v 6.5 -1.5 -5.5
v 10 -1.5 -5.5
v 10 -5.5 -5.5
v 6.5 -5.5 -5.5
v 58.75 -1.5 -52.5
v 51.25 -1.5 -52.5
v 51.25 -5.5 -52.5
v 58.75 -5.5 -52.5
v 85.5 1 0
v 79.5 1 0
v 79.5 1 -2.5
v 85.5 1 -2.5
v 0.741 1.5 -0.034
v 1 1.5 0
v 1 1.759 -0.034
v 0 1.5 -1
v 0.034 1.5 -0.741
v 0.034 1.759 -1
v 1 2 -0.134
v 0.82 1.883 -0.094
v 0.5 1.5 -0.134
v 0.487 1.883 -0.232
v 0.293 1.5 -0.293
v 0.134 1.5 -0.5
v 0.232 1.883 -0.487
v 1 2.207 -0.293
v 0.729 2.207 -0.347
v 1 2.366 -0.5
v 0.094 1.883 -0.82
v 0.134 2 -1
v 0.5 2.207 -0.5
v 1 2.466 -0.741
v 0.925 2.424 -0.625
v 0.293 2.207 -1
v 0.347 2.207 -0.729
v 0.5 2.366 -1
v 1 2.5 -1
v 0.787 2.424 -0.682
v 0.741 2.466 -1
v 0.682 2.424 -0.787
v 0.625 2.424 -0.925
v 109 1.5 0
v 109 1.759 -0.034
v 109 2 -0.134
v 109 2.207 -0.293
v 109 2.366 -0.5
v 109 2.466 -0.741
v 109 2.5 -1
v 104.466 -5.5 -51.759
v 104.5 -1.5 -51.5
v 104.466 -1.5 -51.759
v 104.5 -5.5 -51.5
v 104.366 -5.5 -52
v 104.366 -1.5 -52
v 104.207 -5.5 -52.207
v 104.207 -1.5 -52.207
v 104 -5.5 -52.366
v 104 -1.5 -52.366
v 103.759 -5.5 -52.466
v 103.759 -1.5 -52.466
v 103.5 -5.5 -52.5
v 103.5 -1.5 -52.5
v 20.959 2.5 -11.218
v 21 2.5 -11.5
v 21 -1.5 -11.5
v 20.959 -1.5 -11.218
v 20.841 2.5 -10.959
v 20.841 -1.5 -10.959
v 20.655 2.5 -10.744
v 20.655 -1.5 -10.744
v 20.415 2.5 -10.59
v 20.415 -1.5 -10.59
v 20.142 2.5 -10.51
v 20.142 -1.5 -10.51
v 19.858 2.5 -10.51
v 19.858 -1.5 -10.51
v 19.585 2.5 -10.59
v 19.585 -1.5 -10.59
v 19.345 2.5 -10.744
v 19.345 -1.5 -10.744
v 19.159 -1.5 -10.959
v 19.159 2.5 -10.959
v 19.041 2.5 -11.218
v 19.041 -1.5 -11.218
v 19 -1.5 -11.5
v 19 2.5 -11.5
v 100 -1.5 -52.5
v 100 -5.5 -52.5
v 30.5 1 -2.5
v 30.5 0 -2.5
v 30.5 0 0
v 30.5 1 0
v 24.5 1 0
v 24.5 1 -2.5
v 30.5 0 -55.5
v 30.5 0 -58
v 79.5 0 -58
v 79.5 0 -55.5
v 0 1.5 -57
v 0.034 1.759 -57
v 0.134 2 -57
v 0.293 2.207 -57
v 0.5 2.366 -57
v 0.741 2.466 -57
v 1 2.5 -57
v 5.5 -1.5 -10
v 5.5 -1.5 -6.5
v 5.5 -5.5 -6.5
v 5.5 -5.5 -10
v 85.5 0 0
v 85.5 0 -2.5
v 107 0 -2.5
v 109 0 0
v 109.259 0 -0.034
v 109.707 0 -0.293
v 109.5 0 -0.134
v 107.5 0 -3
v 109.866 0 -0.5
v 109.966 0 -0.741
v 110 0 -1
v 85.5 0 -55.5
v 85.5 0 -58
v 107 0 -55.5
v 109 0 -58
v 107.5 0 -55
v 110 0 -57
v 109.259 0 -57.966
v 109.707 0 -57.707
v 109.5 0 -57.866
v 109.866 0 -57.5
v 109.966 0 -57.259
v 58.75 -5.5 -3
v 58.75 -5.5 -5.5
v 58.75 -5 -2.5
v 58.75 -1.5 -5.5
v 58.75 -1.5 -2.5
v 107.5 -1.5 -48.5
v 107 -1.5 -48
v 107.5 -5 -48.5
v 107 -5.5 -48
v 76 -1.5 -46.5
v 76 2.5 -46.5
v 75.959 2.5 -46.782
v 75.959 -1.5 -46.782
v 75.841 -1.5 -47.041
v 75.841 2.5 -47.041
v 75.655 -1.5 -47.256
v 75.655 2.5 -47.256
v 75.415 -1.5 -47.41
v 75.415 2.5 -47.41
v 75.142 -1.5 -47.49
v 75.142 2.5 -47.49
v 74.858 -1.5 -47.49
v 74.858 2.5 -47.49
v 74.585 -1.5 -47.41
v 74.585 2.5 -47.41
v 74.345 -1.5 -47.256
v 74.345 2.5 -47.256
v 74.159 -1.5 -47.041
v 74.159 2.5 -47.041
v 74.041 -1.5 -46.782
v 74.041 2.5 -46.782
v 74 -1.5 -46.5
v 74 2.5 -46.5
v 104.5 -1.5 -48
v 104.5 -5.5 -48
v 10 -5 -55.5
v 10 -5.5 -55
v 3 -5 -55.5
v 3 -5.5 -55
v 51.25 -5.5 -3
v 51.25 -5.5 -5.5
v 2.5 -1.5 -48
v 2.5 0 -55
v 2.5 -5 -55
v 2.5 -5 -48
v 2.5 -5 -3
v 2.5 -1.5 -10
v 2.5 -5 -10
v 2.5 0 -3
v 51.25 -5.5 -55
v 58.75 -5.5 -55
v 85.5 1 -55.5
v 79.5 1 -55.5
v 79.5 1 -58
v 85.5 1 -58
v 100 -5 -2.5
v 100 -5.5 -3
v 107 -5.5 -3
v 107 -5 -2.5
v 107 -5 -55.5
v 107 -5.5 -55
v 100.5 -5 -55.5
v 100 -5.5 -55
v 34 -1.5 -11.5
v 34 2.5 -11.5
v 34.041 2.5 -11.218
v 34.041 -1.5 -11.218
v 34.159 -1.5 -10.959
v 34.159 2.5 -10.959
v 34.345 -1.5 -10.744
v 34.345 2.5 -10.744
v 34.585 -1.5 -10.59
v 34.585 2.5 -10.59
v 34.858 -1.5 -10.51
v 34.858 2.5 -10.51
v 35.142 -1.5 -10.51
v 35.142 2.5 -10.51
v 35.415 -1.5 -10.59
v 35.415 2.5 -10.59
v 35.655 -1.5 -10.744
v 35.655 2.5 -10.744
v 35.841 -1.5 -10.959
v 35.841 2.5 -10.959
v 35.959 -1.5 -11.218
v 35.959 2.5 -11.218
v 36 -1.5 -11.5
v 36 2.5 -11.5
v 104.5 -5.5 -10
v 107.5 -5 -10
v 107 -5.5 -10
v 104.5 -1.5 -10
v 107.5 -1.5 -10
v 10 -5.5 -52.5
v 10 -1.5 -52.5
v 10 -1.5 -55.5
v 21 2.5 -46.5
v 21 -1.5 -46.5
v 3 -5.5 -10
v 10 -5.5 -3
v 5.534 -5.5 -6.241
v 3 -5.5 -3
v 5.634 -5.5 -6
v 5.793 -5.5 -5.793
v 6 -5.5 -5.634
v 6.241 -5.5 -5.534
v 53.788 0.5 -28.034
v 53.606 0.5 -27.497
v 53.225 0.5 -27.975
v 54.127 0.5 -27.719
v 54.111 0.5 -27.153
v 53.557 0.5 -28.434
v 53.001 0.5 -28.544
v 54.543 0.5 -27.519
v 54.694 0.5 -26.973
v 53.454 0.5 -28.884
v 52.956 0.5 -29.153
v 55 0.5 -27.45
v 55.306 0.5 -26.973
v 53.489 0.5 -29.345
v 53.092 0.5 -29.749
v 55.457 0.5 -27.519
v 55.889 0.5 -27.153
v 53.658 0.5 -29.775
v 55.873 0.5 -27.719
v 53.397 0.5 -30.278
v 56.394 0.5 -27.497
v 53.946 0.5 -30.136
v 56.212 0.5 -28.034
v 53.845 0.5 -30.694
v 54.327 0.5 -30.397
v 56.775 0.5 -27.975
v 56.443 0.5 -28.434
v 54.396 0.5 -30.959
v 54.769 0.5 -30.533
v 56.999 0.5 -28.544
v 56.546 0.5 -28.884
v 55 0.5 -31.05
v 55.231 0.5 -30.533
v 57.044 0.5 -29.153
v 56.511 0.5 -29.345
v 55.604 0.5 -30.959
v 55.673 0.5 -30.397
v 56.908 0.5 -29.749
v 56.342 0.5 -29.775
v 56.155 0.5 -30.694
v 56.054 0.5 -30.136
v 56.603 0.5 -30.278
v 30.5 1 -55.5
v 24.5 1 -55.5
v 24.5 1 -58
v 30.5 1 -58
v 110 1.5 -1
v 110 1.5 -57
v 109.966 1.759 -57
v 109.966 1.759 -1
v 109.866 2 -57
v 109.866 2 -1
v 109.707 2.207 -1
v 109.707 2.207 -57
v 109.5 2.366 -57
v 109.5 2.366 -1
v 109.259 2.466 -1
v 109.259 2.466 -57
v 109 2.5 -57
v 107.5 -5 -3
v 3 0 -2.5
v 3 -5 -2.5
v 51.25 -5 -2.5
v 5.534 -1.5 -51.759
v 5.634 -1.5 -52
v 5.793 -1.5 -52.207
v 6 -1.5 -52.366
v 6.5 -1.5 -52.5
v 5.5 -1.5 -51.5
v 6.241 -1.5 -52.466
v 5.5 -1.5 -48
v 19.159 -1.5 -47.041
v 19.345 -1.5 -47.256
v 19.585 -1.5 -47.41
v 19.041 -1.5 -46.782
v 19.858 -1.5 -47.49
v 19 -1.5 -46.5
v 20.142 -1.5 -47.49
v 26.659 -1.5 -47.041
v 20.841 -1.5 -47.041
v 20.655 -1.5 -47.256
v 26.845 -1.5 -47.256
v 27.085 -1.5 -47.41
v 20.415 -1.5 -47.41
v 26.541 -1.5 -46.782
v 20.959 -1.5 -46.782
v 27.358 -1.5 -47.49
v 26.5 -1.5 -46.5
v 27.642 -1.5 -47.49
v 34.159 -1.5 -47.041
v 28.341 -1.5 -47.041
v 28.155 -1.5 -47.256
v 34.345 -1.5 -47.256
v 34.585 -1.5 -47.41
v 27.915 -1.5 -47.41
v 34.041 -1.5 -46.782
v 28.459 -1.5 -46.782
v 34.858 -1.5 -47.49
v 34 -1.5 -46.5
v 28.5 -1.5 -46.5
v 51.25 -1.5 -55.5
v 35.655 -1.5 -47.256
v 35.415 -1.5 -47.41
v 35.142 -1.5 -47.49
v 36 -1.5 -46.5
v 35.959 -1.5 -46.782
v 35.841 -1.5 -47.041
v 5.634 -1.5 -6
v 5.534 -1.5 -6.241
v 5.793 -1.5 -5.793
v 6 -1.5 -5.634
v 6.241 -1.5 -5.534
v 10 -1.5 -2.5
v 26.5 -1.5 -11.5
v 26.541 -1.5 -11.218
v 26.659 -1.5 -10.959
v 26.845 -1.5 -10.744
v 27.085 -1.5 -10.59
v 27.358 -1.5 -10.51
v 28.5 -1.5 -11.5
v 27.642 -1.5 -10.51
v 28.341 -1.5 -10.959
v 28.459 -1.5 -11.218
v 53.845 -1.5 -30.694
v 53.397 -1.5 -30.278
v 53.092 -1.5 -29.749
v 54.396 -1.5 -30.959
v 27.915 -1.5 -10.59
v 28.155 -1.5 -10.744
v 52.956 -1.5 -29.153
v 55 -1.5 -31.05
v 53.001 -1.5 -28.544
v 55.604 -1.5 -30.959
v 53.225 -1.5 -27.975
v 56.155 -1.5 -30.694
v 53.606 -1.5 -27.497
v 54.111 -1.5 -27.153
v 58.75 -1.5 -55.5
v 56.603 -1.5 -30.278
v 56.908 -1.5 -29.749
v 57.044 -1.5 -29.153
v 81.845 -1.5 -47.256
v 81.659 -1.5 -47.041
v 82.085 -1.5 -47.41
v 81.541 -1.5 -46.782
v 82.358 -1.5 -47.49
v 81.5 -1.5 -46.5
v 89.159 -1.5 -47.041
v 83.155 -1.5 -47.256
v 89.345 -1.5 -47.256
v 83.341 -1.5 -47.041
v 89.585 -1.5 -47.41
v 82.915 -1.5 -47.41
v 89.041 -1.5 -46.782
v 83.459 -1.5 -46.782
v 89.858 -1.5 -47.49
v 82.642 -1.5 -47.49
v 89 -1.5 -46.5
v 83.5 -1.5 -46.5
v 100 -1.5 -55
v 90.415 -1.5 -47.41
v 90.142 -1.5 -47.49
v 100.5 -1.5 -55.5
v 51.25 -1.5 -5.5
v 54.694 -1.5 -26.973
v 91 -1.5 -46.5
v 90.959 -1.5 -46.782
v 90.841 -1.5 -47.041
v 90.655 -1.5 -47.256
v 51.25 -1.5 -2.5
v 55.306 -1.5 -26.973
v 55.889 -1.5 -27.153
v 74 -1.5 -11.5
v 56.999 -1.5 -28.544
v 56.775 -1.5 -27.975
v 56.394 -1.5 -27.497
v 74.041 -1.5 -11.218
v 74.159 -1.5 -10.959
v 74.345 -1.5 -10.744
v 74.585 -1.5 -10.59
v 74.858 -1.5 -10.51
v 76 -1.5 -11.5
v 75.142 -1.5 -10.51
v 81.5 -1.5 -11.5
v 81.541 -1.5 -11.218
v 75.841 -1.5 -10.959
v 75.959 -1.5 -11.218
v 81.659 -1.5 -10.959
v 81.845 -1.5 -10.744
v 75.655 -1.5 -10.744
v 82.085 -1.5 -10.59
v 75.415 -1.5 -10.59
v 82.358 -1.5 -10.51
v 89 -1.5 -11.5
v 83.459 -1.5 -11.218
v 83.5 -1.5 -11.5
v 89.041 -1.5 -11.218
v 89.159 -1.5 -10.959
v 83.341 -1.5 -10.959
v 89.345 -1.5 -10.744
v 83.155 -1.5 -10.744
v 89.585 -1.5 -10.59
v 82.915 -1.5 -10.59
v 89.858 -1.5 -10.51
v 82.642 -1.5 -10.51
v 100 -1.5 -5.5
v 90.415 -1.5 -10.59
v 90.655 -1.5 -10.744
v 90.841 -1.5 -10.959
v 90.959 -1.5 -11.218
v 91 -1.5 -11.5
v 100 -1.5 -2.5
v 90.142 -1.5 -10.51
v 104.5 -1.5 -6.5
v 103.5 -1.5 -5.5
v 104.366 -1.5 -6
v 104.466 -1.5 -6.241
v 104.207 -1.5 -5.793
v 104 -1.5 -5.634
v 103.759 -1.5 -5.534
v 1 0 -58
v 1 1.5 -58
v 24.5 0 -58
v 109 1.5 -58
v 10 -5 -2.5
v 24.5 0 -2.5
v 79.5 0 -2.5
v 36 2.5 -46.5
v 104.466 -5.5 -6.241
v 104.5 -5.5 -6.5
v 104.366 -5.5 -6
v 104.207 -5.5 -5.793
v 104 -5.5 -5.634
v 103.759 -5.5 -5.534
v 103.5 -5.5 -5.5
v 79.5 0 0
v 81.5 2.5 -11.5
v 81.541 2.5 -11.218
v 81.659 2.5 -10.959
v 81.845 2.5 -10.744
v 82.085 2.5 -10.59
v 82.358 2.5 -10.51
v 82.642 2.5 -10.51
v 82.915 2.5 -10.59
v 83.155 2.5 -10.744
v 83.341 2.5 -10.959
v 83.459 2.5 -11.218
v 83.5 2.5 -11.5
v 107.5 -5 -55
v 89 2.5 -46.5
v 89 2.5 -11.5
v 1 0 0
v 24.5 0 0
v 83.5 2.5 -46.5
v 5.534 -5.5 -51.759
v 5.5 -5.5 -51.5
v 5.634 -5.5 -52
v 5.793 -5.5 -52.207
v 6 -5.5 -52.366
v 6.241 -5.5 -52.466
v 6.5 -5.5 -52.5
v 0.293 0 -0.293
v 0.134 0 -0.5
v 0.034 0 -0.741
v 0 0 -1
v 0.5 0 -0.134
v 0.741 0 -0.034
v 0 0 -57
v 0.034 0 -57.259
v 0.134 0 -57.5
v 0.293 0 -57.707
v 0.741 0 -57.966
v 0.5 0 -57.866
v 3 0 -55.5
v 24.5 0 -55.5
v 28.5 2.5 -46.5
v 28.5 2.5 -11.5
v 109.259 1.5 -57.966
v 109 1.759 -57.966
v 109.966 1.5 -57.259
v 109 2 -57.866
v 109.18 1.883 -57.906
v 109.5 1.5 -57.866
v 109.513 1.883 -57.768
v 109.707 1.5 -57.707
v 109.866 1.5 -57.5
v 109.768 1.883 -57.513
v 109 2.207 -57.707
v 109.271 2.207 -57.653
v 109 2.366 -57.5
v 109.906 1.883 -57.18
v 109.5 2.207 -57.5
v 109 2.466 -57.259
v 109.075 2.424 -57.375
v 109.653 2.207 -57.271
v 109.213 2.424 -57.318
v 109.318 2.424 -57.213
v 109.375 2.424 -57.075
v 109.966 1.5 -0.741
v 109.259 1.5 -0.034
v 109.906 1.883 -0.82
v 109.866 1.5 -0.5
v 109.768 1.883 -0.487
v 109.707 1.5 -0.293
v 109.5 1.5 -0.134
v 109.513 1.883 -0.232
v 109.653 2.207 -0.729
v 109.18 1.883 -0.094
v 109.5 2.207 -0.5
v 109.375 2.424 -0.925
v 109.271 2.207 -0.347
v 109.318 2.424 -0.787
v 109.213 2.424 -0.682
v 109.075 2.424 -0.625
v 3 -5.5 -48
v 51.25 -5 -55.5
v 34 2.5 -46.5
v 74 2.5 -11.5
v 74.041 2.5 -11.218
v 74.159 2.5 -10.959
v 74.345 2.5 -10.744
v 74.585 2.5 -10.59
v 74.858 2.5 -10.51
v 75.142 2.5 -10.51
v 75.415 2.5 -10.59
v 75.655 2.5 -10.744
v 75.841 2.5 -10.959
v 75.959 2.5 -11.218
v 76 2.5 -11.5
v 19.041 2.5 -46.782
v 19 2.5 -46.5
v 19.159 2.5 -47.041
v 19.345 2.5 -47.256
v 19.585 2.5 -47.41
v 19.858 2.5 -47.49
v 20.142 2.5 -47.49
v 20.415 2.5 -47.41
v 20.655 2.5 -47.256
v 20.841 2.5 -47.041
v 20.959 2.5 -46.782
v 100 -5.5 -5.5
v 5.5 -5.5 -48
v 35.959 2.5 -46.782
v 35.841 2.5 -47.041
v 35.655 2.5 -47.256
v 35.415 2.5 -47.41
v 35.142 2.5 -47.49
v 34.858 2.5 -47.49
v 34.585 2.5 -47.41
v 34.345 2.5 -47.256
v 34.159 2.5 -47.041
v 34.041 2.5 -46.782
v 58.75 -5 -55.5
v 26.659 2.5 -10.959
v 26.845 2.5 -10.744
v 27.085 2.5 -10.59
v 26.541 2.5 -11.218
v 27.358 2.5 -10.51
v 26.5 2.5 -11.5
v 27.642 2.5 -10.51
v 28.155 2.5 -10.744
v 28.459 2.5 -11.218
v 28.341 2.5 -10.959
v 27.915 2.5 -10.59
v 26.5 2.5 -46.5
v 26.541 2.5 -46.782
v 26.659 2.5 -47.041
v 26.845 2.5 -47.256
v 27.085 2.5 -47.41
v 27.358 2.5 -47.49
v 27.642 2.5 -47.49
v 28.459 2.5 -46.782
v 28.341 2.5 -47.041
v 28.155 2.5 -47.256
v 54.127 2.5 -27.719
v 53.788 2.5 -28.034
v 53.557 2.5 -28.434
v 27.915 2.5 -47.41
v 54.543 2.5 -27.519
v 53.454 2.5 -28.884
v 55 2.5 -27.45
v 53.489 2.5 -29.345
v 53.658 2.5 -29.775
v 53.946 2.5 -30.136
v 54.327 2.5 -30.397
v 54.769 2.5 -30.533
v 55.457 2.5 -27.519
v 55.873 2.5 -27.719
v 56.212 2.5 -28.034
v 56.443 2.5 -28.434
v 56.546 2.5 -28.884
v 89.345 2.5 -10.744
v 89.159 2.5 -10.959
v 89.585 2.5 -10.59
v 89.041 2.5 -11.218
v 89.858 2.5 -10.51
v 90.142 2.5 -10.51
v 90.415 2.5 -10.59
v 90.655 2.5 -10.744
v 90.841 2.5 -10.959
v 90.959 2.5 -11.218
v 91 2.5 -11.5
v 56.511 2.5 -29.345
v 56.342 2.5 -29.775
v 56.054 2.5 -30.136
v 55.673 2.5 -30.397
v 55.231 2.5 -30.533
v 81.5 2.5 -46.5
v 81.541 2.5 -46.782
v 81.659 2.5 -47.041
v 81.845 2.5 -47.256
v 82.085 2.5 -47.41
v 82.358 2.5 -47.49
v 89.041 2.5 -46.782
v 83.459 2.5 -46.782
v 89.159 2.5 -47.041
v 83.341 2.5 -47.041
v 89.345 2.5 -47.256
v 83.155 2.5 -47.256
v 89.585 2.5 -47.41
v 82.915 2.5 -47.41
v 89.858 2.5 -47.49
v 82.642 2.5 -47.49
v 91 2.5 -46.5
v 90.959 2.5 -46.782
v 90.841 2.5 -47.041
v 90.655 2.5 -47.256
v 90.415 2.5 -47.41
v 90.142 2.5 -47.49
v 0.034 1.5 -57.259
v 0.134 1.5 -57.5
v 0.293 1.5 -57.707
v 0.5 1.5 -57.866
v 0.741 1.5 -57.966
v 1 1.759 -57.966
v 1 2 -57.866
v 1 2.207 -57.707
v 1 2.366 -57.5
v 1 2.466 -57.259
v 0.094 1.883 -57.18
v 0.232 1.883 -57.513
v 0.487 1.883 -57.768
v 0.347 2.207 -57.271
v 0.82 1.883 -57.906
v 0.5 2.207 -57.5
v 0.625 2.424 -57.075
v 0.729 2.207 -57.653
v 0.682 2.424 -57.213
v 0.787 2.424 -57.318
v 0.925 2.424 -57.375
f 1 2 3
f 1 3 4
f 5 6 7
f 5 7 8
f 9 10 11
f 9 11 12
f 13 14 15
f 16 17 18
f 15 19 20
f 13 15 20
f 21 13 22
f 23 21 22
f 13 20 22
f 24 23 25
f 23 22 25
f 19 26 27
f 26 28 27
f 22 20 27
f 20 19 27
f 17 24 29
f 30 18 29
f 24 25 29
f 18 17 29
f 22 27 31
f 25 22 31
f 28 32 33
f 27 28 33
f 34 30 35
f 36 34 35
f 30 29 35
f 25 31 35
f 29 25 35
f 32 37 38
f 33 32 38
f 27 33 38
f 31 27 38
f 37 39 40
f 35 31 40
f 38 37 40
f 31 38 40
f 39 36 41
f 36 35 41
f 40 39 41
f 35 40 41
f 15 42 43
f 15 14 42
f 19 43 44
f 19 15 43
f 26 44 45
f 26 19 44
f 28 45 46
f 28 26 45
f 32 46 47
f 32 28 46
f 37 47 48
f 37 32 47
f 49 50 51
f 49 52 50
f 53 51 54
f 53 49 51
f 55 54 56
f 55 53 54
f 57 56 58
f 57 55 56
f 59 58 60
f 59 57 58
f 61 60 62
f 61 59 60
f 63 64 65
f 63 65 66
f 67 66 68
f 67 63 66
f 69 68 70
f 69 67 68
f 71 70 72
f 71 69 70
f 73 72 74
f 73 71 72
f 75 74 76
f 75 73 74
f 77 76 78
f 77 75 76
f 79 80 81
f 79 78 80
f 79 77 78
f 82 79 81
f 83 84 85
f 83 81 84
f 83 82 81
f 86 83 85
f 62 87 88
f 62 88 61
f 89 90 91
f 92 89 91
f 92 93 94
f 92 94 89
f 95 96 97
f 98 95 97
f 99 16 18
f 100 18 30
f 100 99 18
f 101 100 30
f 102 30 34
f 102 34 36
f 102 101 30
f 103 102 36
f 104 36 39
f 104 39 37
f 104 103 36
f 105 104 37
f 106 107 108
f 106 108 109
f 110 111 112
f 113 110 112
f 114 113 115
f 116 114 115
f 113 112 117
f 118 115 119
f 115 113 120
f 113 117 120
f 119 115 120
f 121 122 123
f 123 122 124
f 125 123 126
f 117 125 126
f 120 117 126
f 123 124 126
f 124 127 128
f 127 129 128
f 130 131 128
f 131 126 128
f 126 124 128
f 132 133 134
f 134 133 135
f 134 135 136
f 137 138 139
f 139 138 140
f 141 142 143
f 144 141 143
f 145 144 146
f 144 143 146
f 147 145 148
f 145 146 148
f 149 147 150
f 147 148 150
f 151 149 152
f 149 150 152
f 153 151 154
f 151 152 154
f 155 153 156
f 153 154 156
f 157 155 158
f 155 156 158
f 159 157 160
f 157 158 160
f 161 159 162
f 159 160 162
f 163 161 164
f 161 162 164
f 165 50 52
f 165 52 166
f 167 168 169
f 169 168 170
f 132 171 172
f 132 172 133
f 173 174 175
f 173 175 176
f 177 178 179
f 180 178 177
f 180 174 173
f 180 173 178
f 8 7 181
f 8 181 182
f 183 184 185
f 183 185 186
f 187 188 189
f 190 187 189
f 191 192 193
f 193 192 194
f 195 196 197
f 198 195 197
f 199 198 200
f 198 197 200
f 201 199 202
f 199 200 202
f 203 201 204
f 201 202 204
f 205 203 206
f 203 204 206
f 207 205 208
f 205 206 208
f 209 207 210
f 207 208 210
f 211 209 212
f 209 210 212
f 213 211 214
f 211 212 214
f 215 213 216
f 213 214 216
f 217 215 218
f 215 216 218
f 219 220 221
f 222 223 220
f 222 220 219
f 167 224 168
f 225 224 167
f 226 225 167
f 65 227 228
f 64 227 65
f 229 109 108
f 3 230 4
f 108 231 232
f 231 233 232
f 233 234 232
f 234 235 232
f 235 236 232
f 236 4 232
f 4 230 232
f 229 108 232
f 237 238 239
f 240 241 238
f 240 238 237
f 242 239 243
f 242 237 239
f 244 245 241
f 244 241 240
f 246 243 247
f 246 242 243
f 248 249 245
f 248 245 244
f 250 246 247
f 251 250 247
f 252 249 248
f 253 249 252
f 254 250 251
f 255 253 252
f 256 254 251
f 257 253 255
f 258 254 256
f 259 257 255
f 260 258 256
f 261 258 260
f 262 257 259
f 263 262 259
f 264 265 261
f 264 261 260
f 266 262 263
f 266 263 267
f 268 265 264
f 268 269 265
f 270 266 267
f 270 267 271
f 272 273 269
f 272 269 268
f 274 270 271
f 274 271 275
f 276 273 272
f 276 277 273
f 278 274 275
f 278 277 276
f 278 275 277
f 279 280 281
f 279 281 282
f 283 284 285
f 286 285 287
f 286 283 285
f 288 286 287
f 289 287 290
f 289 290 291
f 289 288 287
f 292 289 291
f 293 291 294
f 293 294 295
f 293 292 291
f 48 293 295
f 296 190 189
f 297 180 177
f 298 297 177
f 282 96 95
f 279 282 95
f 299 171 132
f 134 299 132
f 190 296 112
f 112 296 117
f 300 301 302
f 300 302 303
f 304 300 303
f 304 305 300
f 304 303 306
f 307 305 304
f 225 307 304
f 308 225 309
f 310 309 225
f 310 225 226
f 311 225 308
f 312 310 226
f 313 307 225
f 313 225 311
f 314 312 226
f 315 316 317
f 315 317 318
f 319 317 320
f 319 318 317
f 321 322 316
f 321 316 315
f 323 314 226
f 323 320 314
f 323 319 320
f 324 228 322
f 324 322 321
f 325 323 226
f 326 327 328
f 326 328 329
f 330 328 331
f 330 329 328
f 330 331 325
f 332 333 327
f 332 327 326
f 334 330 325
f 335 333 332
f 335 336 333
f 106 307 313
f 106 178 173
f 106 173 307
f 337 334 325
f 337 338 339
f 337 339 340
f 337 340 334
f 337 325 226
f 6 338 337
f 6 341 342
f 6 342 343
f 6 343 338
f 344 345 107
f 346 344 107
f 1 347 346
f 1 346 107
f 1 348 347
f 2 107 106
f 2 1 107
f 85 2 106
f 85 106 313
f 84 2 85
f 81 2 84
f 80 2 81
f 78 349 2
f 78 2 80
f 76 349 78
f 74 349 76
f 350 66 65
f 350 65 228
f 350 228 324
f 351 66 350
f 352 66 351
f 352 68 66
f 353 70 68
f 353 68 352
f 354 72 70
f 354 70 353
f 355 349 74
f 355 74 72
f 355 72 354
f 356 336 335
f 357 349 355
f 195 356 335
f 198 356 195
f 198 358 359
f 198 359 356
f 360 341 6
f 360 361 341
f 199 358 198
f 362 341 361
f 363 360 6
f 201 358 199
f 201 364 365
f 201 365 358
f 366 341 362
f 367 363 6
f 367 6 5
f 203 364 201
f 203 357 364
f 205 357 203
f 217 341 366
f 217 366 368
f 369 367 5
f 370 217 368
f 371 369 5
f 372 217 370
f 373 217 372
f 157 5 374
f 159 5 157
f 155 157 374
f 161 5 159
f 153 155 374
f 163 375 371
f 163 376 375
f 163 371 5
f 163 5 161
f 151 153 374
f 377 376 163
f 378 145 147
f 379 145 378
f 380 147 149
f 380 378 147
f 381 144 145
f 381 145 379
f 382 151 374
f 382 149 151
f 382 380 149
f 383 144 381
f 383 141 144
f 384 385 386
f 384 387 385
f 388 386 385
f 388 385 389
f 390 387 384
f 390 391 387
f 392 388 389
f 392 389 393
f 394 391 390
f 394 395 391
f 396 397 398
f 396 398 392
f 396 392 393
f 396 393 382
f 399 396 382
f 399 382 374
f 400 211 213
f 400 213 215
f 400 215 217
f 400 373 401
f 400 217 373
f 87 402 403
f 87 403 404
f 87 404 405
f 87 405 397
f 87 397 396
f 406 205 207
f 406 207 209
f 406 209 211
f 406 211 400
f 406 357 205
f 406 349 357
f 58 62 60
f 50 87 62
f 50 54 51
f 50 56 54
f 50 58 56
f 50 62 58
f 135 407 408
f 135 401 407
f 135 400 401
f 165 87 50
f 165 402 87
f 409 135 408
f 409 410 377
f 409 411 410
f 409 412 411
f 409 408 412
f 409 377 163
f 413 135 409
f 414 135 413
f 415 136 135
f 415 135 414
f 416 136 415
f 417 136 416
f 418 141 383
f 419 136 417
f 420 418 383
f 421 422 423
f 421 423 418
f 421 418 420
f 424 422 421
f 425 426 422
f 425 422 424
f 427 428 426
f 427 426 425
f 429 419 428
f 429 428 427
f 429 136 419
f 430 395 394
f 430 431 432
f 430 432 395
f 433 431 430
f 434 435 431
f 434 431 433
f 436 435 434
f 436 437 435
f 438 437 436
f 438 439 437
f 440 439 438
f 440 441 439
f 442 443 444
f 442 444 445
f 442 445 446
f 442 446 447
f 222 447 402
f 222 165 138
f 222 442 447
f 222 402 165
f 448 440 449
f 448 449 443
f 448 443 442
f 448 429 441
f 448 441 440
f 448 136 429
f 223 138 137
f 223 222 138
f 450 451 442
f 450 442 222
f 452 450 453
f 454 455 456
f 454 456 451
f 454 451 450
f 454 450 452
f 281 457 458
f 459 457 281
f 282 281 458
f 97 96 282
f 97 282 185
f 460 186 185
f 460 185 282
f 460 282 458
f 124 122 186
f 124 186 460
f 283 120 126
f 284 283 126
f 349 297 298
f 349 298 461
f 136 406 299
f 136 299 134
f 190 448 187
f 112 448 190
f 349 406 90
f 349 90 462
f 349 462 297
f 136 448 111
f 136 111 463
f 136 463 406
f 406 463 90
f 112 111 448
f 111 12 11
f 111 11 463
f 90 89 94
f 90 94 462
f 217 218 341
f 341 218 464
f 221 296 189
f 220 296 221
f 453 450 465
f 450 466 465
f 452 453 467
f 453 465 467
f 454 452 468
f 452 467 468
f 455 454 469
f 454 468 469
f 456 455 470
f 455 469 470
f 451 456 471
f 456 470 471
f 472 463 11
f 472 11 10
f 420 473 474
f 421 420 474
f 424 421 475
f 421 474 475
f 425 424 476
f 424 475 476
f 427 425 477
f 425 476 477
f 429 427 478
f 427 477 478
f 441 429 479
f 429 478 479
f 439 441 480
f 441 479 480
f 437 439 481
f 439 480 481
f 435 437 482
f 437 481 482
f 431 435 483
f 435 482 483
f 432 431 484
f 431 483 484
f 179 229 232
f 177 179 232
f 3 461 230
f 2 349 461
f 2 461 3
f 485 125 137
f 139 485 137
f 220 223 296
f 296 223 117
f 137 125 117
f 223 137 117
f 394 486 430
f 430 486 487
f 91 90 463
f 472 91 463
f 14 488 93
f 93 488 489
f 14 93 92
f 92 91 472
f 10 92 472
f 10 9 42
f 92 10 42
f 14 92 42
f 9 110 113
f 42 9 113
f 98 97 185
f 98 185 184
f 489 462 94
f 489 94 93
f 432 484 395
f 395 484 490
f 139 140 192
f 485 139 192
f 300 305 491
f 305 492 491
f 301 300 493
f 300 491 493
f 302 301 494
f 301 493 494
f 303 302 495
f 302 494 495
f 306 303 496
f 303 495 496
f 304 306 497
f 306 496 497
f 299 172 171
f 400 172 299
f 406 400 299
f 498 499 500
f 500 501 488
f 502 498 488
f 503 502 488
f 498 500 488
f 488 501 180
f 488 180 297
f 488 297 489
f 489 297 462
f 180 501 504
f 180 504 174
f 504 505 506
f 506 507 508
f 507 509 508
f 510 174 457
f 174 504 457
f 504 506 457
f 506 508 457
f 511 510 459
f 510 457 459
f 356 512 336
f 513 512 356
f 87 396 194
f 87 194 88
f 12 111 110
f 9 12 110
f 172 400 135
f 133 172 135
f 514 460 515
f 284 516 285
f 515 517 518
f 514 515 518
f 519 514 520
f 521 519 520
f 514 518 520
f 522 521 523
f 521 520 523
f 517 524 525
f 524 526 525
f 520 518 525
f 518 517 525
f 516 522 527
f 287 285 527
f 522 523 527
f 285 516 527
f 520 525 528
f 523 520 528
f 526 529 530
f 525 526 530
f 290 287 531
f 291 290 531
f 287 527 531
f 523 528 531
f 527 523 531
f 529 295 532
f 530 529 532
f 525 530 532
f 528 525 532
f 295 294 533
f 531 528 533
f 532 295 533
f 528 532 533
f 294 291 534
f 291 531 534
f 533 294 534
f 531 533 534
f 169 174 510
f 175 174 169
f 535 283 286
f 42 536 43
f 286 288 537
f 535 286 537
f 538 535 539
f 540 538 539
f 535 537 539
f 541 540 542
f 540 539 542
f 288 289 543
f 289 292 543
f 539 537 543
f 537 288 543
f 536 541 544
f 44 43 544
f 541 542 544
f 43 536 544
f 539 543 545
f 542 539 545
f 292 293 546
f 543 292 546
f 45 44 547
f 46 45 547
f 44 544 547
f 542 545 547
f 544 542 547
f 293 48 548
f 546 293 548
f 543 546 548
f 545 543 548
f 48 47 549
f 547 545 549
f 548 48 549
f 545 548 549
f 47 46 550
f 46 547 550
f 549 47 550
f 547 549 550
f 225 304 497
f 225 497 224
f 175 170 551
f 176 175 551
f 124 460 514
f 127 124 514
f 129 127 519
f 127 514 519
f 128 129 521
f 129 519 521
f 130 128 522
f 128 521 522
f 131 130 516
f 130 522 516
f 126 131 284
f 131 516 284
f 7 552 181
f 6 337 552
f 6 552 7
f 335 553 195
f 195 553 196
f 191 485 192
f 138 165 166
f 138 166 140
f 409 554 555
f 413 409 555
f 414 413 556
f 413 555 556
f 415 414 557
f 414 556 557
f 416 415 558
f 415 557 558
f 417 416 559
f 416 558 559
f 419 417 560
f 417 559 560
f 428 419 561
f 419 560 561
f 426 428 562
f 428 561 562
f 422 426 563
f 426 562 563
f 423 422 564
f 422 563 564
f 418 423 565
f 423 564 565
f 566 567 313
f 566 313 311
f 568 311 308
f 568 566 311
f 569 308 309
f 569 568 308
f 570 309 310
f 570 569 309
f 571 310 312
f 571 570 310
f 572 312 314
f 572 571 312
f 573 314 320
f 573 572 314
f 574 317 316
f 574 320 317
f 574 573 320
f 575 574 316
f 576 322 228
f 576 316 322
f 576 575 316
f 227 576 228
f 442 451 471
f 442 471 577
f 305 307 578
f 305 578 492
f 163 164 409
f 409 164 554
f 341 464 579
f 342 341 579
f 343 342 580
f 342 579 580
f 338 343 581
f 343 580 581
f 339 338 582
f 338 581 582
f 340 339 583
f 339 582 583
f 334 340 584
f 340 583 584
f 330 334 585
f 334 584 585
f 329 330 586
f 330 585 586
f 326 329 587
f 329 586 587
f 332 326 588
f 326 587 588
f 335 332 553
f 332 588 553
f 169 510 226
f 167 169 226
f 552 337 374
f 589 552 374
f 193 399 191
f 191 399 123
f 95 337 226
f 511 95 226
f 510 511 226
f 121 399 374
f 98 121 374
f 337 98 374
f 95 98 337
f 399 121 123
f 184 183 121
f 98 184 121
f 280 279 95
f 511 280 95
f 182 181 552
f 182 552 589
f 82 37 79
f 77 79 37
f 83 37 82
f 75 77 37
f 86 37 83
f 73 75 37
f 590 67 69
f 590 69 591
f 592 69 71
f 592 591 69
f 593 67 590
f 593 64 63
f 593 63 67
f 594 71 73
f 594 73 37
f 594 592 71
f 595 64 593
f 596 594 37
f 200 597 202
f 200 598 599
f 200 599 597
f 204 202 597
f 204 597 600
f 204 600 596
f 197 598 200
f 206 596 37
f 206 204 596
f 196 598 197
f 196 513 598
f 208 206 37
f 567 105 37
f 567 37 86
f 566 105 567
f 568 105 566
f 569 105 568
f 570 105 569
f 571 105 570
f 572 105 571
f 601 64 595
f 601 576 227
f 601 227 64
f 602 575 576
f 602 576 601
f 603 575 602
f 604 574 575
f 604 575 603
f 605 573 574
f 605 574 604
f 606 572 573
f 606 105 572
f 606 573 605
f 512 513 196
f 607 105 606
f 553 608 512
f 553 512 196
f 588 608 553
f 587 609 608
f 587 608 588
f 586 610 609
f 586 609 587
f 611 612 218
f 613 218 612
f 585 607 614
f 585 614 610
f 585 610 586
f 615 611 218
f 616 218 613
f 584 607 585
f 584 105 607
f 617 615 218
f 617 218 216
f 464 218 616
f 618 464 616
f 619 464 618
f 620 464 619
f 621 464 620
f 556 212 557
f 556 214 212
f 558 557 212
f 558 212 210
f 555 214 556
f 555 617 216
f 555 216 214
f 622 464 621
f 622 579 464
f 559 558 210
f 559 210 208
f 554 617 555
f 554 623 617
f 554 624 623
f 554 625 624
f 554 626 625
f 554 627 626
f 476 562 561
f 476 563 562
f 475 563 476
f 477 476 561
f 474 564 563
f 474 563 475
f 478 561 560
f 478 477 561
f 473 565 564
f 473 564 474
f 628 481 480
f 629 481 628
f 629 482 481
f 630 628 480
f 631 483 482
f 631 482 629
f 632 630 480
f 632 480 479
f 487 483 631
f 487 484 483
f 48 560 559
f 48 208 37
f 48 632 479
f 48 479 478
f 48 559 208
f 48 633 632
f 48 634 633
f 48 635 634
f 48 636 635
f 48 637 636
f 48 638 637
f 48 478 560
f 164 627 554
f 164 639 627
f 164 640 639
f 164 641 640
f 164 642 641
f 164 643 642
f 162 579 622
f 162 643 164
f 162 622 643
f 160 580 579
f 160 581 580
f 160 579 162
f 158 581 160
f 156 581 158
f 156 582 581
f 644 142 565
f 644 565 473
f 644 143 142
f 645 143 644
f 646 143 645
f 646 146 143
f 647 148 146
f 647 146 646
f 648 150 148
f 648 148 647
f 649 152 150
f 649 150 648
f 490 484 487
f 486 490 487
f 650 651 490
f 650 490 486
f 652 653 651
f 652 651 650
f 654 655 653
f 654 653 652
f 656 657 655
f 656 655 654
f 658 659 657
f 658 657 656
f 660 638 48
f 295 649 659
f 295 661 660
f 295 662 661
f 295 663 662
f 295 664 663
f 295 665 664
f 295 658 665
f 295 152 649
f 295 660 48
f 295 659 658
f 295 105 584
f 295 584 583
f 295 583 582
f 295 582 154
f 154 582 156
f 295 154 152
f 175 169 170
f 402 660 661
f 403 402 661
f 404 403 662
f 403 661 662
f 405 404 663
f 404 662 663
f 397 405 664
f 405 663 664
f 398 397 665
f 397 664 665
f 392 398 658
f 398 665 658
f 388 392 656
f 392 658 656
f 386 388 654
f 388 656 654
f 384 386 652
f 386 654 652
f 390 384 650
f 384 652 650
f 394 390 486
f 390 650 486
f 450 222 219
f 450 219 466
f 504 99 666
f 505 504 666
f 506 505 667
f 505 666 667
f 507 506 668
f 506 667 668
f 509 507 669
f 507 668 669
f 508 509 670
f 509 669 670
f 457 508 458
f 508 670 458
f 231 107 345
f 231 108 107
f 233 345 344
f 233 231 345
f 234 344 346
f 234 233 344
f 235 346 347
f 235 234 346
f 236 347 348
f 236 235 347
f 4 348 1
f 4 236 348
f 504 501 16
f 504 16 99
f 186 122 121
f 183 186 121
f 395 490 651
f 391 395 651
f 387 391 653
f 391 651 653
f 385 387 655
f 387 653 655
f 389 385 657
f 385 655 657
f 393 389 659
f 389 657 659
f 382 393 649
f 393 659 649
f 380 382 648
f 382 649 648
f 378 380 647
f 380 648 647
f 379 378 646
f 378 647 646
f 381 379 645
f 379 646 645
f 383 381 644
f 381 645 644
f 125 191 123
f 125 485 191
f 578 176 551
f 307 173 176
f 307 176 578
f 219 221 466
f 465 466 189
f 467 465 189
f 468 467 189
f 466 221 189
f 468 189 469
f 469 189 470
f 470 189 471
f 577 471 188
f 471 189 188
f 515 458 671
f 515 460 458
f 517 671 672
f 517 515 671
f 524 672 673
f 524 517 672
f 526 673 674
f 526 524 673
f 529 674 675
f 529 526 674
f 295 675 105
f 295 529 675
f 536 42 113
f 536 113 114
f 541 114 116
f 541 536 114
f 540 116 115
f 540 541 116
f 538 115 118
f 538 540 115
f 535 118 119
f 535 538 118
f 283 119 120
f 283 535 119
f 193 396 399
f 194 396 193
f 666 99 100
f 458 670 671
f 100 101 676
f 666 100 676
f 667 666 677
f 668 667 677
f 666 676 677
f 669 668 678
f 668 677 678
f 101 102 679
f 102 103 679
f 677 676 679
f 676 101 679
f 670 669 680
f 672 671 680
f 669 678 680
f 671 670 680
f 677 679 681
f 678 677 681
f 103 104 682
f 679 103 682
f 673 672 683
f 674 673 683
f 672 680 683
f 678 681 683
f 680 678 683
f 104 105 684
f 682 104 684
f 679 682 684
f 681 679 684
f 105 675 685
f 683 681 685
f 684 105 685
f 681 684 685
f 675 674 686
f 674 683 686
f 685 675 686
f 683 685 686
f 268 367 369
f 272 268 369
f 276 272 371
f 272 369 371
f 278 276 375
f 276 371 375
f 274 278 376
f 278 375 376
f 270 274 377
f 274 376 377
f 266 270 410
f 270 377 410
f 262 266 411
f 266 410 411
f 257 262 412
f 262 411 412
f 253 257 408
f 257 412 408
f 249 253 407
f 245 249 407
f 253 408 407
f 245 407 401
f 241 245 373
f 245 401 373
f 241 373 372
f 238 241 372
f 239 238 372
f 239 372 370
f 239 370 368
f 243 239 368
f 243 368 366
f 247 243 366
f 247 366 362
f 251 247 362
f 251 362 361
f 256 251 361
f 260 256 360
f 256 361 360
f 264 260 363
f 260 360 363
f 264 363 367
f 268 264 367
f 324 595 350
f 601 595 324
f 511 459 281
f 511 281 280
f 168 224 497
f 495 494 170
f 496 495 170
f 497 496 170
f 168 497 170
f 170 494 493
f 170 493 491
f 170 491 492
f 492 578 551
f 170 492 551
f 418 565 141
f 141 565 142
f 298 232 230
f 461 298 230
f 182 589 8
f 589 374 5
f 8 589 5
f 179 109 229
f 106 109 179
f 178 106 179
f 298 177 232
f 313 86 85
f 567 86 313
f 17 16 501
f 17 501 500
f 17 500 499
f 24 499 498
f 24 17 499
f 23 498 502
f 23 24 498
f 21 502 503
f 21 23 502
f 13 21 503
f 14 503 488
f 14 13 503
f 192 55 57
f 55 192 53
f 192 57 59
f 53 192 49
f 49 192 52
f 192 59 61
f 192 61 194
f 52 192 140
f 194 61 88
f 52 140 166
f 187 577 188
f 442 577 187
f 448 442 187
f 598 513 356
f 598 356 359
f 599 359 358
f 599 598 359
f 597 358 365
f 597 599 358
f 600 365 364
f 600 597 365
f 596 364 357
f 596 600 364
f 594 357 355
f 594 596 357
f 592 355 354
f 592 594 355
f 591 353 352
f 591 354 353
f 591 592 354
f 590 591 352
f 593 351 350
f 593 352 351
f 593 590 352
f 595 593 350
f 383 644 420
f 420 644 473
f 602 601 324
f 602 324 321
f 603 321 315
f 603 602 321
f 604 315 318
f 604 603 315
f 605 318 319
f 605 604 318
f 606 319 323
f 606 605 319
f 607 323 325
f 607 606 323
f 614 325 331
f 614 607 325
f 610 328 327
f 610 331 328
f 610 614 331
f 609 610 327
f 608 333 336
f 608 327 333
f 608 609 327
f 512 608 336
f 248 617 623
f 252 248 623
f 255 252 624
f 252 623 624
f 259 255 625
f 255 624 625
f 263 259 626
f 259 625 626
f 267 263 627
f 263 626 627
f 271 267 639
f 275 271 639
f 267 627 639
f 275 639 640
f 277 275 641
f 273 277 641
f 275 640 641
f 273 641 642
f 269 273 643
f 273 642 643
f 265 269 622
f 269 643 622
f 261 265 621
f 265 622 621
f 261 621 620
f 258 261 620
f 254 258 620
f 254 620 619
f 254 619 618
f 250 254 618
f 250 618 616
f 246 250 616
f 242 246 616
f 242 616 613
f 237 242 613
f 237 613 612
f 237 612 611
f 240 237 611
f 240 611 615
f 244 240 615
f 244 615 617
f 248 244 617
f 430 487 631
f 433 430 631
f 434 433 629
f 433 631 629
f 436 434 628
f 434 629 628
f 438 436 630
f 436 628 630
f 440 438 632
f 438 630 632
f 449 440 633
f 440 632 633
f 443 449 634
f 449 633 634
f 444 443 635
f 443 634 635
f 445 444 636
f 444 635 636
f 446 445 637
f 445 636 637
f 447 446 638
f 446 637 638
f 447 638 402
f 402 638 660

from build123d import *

# Parameters (mm, degrees)
SKETCH1_W           = 110
SKETCH1_H           = 58
BOSS_EXTRUDE1_DEPTH = 2.5
SKETCH2_W           = 105
SKETCH2_H           = 53
BOSS_EXTRUDE2_DEPTH = 1.5
SKETCH3_W           = 7.5
SKETCH3_H           = 3
BOSS_EXTRUDE3_DEPTH = 4
FILLET1_R           = 1
SKETCH4_W           = 6
SKETCH4_H           = 2.5
CUT_EXTRUDE1_DEPTH  = 1
FILLET2_R           = 1
CHAMFER1_SIZE       = 0.5
CUT_EXTRUDE2_DEPTH  = 125.611395948
FILLET3_R           = 1
SKETCH6_R           = 1.55
CUT_EXTRUDE3_DEPTH  = 125.611395948
SKETCH7_R           = 2.05
CUT_EXTRUDE4_DEPTH  = 2


with BuildPart() as part:
    # Sketch1 → Boss-Extrude1 (new body)
    with BuildSketch(Plane(origin=(0, 0, 0), x_dir=(1, 0, 0), z_dir=(0, 1, 0))):
        with Locations((55, 29)):
            Rectangle(SKETCH1_W, SKETCH1_H)
    extrude(amount=BOSS_EXTRUDE1_DEPTH)

    # Sketch2 → Boss-Extrude2 (add)
    with BuildSketch(Plane.XZ):
        with Locations((55, -29)):
            Rectangle(SKETCH2_W, SKETCH2_H)
    extrude(amount=BOSS_EXTRUDE2_DEPTH)

    # Sketch3 → Boss-Extrude3 (add)
    with BuildSketch(Plane.XZ.offset(1.5)):
        with Locations((55, -4)):
            Rectangle(SKETCH3_W, SKETCH3_H)
        Polygon((2.5, -2.5), (10, -2.5), (10, -5.5), (5.5, -5.5), (5.5, -10), (2.5, -10), align=None)
        Polygon((107.5, -2.5), (107.5, -10), (104.5, -10), (104.5, -5.5), (100, -5.5), (100, -2.5), align=None)
        Polygon((107.5, -55.5), (100, -55.5), (100, -52.5), (104.5, -52.5), (104.5, -48), (107.5, -48), align=None)
        with Locations((55, -54)):
            Rectangle(SKETCH3_W, SKETCH3_H)
        Polygon((2.5, -55.5), (2.5, -48), (5.5, -48), (5.5, -52.5), (10, -52.5), (10, -55.5), align=None)
    extrude(amount=BOSS_EXTRUDE3_DEPTH)

    # Fillet1
    fillet1_edges = [part.edges().sort_by_distance(p)[0] for p in [
        (104.5, -3.5, -52.5),
        (5.5, -3.5, -5.5),
        (104.5, -3.5, -5.5),
        (5.5, -3.5, -52.5),
    ]]
    fillet(fillet1_edges, radius=FILLET1_R)

    # Sketch4 → Cut-Extrude1 (cut)
    with BuildSketch(Plane.XZ):
        with Locations((27.5, -1.25)):
            Rectangle(SKETCH4_W, SKETCH4_H)
        with Locations((82.5, -1.25)):
            Rectangle(SKETCH4_W, SKETCH4_H)
        with Locations((82.5, -56.75)):
            Rectangle(SKETCH4_W, SKETCH4_H)
        with Locations((27.5, -56.75)):
            Rectangle(SKETCH4_W, SKETCH4_H)
    extrude(amount=-CUT_EXTRUDE1_DEPTH, mode=Mode.SUBTRACT)

    # Fillet2
    fillet2_edges = [part.edges().sort_by_distance(p)[0] for p in [
        (0, 1.25, -58),
        (110, 1.25, -58),
        (110, 1.25, 0),
        (0, 1.25, 0),
    ]]
    fillet(fillet2_edges, radius=FILLET2_R)

    # Chamfer1
    chamfer1_edges = [part.edges().sort_by_distance(p)[0] for p in [
        (2.5, -2.75, -2.5),
        (2.5, -2.75, -55.5),
        (107.5, -2.75, -55.5),
        (107.5, -2.75, -2.5),
        (107.5, -3.5, -48),
        (100, -3.5, -55.5),
        (107.5, -5.5, -51.75),
        (103.75, -5.5, -55.5),
        (2.5, -5.5, -6.25),
        (6.25, -5.5, -2.5),
        (55, -5.5, -2.5),
        (103.75, -5.5, -2.5),
        (107.5, -5.5, -6.25),
        (55, -5.5, -55.5),
        (6.25, -5.5, -55.5),
        (2.5, -5.5, -51.75),
    ]]
    chamfer(chamfer1_edges, length=CHAMFER1_SIZE)

    # Sketch5 → Cut-Extrude2 (cut, through all)
    with BuildSketch(Plane(origin=(0, 2.5, 0), x_dir=(1, 0, 0), z_dir=(0, 1, 0))):
        with BuildLine():
            Line((28.5, 46.5), (28.5, 11.5))
            ThreePointArc((28.5, 11.5), (27.5, 10.5), (26.5, 11.5))
            Line((26.5, 11.5), (26.5, 46.5))
            ThreePointArc((26.5, 46.5), (27.5, 47.5), (28.5, 46.5))
        make_face()
        with BuildLine():
            Line((34, 46.5), (34, 11.5))
            ThreePointArc((34, 11.5), (35, 10.5), (36, 11.5))
            Line((36, 11.5), (36, 46.5))
            ThreePointArc((36, 46.5), (35, 47.5), (34, 46.5))
        make_face()
        with BuildLine():
            Line((21, 46.5), (21, 11.5))
            ThreePointArc((21, 11.5), (20, 10.5), (19, 11.5))
            Line((19, 11.5), (19, 46.5))
            ThreePointArc((19, 46.5), (20, 47.5), (21, 46.5))
        make_face()
        with BuildLine():
            Line((89, 46.5), (89, 11.5))
            ThreePointArc((89, 11.5), (90, 10.5), (91, 11.5))
            Line((91, 11.5), (91, 46.5))
            ThreePointArc((91, 46.5), (90, 47.5), (89, 46.5))
        make_face()
        with BuildLine():
            Line((74, 46.5), (74, 11.5))
            ThreePointArc((74, 11.5), (75, 10.5), (76, 11.5))
            Line((76, 11.5), (76, 46.5))
            ThreePointArc((76, 46.5), (75, 47.5), (74, 46.5))
        make_face()
        with BuildLine():
            Line((81.5, 46.5), (81.5, 11.5))
            ThreePointArc((81.5, 11.5), (82.5, 10.5), (83.5, 11.5))
            Line((83.5, 11.5), (83.5, 46.5))
            ThreePointArc((83.5, 46.5), (82.5, 47.5), (81.5, 46.5))
        make_face()
    extrude(amount=-CUT_EXTRUDE2_DEPTH, mode=Mode.SUBTRACT)

    # Fillet3
    fillet3_edges = [part.edges().sort_by_distance(p)[0] for p in [
        (0, 2.5, -29),
        (55, 2.5, -58),
        (55, 2.5, 0),
        (110, 2.5, -29),
        (109.707106781, 2.5, -0.292893219),
        (109.707106781, 2.5, -57.707106781),
        (0.292893219, 2.5, -0.292893219),
        (0.292893219, 2.5, -57.707106781),
    ]]
    fillet(fillet3_edges, radius=FILLET3_R)

    # Sketch6 → Cut-Extrude3 (cut, through all)
    with BuildSketch(Plane(origin=(0, 2.5, 0), x_dir=(1, 0, 0), z_dir=(0, 1, 0))):
        with Locations(Location((55, 29, 0), (0, 0, 270))):
            Circle(SKETCH6_R)
    extrude(amount=-CUT_EXTRUDE3_DEPTH, mode=Mode.SUBTRACT)

    # Sketch7 → Cut-Extrude4 (cut)
    with BuildSketch(Plane.XZ.offset(1.5)):
        with Locations(Location((55, -29, 0), (0, 0, 270))):
            Circle(SKETCH7_R)
    extrude(amount=-CUT_EXTRUDE4_DEPTH, mode=Mode.SUBTRACT)


solid = part.part
